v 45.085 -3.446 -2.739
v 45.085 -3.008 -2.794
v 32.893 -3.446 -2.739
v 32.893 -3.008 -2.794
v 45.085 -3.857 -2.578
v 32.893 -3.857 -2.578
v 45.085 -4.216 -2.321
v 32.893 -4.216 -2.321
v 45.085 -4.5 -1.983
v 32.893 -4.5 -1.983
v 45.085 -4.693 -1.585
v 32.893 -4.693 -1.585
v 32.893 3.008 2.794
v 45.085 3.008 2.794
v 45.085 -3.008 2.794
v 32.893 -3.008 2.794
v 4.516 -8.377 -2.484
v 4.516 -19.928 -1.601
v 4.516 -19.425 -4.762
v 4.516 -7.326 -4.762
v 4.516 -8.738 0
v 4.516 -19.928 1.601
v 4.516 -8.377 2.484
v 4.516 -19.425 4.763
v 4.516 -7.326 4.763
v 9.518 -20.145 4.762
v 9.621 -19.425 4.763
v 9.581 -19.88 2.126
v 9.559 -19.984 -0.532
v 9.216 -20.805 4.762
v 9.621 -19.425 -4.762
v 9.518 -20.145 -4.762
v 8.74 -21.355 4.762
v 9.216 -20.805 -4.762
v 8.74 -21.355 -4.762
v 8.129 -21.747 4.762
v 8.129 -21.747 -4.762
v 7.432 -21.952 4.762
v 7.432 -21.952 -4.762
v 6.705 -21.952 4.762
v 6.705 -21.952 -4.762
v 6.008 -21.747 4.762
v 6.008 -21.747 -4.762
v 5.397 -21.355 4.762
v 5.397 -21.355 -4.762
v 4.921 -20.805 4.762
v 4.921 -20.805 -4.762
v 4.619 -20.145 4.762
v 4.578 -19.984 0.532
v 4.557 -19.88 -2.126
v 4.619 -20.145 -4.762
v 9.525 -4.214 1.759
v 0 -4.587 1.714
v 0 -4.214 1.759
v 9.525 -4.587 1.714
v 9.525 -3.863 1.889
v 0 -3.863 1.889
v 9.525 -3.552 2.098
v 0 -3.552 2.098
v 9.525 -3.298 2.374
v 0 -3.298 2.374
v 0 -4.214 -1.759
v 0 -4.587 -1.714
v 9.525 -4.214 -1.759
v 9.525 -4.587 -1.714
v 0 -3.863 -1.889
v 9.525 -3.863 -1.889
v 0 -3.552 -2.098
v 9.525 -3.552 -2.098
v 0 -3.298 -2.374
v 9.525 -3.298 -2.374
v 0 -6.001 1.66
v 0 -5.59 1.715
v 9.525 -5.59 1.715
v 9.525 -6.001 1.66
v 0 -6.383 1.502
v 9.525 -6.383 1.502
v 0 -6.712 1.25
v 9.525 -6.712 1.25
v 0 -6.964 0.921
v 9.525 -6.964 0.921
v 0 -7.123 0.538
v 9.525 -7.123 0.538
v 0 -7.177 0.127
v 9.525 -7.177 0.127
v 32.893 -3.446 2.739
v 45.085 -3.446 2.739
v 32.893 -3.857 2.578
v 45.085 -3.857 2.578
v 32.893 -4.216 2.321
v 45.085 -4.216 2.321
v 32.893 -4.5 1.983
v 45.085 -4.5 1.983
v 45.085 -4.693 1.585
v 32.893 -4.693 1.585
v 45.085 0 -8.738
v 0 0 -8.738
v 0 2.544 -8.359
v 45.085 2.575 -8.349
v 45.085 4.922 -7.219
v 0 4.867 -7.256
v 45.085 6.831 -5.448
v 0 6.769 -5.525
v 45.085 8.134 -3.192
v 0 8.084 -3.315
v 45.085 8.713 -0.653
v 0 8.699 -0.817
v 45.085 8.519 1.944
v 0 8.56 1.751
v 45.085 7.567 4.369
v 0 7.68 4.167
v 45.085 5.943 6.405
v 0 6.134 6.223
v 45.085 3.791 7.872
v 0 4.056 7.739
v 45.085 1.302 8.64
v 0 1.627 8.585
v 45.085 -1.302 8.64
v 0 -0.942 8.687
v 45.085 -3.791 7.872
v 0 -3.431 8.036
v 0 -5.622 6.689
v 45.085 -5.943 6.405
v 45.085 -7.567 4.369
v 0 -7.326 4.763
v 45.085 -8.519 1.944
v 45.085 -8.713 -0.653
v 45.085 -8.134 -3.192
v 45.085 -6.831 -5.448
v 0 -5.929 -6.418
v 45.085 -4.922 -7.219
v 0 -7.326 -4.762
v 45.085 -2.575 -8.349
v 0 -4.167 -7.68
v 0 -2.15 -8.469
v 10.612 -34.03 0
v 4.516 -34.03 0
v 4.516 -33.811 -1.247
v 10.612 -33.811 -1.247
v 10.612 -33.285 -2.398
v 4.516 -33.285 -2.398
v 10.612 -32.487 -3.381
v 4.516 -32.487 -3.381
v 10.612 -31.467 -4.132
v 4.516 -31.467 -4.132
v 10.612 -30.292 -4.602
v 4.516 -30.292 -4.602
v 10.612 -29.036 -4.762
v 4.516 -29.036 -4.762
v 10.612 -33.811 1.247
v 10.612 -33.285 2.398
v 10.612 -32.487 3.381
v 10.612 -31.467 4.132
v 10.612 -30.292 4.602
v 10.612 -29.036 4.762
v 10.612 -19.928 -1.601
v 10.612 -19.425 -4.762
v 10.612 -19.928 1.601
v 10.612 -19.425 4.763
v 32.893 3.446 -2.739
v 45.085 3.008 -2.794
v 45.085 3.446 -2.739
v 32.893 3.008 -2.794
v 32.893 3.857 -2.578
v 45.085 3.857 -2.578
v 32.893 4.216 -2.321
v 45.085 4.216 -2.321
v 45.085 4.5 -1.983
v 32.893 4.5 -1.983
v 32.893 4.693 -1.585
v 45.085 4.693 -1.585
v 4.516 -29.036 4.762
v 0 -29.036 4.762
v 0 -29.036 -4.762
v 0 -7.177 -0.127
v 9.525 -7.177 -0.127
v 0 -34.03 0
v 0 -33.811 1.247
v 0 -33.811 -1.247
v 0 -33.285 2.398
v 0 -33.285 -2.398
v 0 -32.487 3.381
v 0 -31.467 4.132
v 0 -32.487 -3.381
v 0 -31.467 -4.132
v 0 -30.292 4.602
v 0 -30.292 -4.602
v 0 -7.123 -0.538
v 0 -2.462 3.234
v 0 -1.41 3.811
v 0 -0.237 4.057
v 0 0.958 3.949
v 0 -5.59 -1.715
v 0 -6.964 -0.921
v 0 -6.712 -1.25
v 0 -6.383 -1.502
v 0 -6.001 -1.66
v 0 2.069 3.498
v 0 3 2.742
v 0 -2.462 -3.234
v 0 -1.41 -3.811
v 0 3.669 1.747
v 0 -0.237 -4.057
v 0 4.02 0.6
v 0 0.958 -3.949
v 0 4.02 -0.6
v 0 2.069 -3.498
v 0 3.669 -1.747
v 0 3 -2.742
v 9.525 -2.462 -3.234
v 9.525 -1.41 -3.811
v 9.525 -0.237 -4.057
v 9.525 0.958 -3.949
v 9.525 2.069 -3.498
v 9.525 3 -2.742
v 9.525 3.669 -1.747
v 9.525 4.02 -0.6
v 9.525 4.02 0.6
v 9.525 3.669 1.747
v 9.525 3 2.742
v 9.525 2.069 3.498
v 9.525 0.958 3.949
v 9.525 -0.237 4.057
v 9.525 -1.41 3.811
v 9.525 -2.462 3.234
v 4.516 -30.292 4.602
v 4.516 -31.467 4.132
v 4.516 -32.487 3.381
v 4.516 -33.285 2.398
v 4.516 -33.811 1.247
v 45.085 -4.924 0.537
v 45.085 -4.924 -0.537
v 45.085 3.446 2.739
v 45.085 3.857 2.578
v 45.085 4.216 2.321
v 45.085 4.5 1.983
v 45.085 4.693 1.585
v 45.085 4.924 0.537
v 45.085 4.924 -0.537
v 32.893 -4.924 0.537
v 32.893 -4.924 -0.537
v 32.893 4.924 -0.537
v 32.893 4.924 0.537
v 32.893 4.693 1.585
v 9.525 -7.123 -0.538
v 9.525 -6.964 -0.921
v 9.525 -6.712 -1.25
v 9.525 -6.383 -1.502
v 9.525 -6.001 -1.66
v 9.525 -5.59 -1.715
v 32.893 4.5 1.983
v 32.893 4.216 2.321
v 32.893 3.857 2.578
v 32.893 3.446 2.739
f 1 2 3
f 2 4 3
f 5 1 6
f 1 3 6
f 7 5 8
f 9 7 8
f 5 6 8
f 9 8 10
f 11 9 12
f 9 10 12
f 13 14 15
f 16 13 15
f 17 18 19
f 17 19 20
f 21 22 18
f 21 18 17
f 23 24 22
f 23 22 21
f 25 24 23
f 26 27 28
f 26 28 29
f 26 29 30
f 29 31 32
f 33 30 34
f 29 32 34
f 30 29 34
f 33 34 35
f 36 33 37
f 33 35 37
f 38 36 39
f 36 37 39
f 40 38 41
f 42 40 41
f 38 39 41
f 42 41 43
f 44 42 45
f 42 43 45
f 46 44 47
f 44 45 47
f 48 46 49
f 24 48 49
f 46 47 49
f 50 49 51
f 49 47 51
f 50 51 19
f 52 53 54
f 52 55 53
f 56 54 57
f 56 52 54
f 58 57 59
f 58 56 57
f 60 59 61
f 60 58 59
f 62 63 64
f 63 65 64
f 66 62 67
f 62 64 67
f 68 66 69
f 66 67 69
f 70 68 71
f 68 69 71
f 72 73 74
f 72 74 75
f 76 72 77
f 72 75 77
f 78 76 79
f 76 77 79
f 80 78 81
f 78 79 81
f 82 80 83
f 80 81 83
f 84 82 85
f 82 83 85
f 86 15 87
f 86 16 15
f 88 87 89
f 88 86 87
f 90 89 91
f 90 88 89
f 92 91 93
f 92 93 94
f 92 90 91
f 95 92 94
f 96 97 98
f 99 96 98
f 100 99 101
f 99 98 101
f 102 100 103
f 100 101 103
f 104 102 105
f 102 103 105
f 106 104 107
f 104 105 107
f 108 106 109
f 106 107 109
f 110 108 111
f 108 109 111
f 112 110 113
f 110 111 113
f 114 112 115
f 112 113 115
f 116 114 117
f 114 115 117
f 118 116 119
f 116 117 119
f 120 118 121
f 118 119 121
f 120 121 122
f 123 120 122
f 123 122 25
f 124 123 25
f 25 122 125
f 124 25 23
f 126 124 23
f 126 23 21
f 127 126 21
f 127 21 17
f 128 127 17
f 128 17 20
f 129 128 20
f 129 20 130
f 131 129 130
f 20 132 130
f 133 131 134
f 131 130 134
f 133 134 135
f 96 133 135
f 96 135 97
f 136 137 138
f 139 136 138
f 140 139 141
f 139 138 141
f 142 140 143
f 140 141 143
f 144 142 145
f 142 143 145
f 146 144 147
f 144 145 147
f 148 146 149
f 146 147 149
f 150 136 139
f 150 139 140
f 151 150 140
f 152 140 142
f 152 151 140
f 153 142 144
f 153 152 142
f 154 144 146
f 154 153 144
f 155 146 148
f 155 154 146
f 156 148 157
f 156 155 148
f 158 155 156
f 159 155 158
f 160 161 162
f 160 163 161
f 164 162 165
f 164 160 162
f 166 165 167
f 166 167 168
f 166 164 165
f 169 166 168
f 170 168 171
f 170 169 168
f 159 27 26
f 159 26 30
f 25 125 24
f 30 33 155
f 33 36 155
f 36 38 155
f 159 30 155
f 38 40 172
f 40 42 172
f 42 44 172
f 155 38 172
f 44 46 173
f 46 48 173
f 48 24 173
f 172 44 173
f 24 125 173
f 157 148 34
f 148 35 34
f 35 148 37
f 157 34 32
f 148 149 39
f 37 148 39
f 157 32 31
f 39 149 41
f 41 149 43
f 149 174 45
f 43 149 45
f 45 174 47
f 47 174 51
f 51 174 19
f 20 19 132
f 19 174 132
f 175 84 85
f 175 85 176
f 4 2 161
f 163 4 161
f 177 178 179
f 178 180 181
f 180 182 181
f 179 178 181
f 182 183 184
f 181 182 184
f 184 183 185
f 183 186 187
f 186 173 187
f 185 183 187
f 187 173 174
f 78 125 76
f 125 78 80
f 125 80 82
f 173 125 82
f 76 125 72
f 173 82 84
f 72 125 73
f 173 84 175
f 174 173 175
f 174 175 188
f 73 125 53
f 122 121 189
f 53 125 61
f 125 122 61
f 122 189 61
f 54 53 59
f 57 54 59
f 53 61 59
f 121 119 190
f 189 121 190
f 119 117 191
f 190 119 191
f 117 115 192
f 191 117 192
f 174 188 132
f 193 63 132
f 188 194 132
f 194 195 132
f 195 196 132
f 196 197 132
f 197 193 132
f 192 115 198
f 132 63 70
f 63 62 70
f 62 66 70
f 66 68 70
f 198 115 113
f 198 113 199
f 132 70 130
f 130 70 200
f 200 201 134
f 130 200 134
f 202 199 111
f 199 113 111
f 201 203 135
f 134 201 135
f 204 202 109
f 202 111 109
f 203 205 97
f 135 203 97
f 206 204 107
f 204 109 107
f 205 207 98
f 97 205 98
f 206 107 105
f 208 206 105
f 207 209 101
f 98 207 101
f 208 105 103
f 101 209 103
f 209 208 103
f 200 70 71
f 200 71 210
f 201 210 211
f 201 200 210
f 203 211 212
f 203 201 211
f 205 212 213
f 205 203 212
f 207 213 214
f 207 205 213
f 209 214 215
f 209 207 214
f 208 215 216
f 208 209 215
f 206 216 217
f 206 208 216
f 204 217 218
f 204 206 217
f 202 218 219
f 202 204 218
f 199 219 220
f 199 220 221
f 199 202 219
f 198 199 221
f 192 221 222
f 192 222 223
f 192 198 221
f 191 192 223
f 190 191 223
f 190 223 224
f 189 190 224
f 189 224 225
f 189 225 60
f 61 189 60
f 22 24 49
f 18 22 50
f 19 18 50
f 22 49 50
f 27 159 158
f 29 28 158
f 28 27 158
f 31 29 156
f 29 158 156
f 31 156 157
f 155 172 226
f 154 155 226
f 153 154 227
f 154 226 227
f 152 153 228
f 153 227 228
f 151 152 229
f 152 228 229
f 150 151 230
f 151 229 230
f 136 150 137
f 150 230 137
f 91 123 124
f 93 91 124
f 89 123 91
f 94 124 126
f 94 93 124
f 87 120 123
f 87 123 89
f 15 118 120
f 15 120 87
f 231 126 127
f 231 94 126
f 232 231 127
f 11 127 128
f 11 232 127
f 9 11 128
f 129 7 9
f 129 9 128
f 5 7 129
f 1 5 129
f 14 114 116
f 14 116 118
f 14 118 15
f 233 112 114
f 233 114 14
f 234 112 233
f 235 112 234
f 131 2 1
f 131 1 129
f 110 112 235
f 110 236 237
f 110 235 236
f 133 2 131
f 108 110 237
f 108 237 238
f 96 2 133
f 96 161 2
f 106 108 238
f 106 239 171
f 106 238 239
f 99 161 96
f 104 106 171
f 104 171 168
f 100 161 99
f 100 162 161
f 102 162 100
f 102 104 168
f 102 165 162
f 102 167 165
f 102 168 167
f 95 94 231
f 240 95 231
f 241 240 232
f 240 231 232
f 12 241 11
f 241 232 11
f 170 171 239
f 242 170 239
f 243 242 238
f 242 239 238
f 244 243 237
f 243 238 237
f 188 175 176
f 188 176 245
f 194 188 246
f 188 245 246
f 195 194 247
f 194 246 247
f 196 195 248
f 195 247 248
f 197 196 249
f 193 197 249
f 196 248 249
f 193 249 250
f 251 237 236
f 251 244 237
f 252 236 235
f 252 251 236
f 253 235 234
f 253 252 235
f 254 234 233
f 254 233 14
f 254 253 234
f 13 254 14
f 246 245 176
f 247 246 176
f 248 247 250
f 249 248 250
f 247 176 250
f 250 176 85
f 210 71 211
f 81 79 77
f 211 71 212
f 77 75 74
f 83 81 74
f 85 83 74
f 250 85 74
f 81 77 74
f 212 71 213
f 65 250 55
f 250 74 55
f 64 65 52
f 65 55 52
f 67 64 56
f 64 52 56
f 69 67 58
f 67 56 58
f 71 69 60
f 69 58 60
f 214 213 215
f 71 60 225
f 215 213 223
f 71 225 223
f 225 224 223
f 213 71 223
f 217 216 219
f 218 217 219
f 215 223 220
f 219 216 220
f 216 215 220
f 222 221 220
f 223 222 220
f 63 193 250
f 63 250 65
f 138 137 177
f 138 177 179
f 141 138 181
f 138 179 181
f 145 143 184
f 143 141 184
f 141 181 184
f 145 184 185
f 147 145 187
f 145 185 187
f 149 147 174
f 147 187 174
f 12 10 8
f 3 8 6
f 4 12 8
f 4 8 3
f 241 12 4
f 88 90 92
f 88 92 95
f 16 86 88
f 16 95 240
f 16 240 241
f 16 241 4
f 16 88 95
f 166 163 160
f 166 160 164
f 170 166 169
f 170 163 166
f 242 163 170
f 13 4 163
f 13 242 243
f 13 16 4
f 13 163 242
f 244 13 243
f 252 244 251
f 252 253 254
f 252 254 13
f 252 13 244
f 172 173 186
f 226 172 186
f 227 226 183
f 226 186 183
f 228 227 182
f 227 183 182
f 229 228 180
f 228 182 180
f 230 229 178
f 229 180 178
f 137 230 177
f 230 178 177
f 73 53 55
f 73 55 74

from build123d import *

# Parameters (mm, degrees)
SKETCH1_R           = 8.7376
BOSS_EXTRUDE1_DEPTH = 45.085
BOSS_EXTRUDE3_DEPTH = 4.516000112
FILLET2_R           = 5
BOSS_EXTRUDE4_DEPTH = 6.096
CUT_EXTRUDE8_DEPTH  = 6.096
CUT_EXTRUDE10_DEPTH = 12.192
FILLET11_R          = 1.778
SKETCH25_R          = 2.5527
CUT_EXTRUDE14_DEPTH = 59.077319733
CUT_EXTRUDE15_DEPTH = 9.525
FILLET12_R          = 1.5875


with BuildPart() as part:
    # Sketch1 → Boss-Extrude1 (new body)
    with BuildSketch(Plane.YZ):
        with Locations(Location((0, 0, 0), (0, 0, 270))):
            Circle(SKETCH1_R)
    extrude(amount=BOSS_EXTRUDE1_DEPTH)

    # Sketch10 → Boss-Extrude3 (add)
    with BuildSketch(Plane(origin=(0, 0, 0), x_dir=(0, -1, 0), z_dir=(-1, 0, 0))):
        with BuildLine():
            Line((7.325588544, 4.7625), (34.036, 4.7625))
            Line((34.036, 4.7625), (34.036, -4.7625))
            Line((34.036, -4.7625), (7.325588544, -4.7625))
            ThreePointArc((7.325588544, -4.7625), (8.7376, 0), (7.325588544, 4.7625))
        make_face()
    extrude(amount=-BOSS_EXTRUDE3_DEPTH)

    # Fillet2
    # the kernel refuses this fillet: 5 mm, written as the material it takes off along each edge
    with BuildSketch(Plane(origin=(-12.5, -34.036, 4.7625), x_dir=(0, 1, 0), z_dir=(1, 0, 0))) as fillet2_piece_1:
        with BuildLine():
            CenterArc((FILLET2_R, -FILLET2_R), FILLET2_R, 90, 90)
            Line((0, -FILLET2_R), (0, 0))
            Line((0, 0), (FILLET2_R, 0))
        make_face()
    extrude(amount=29.516000112, mode=Mode.SUBTRACT)
    with BuildSketch(Plane(origin=(-12.5, -34.036, -4.7625), x_dir=(0, 1, 0), z_dir=(1, 0, 0))) as fillet2_piece_2:
        with BuildLine():
            CenterArc((FILLET2_R, FILLET2_R), FILLET2_R, 180, 90)
            Line((0, FILLET2_R), (0, 0))
            Line((0, 0), (FILLET2_R, 0))
        make_face()
    extrude(amount=29.516000112, mode=Mode.SUBTRACT)

    # Sketch15 → Boss-Extrude4 (add)
    with BuildSketch(Plane.YZ.offset(4.516000112)):
        with BuildLine():
            Line((-18.79035619, -4.7625), (-18.79035619, 4.7625))
            Line((-18.79035619, 4.7625), (-29.036, 4.7625))
            ThreePointArc((-29.036, 4.7625), (-32.486543435, 3.381028707), (-34.03035619, 0))
            ThreePointArc((-34.03035619, 0), (-32.486543435, -3.381028707), (-29.036, -4.7625))
            Line((-29.036, -4.7625), (-18.79035619, -4.7625))
        make_face()
    extrude(amount=BOSS_EXTRUDE4_DEPTH)

    # Sketch21 → Cut-Extrude8 (cut)
    with BuildSketch(Plane.YZ.offset(10.612000112)):
        with BuildLine():
            Line((-19.42535619, -4.7625), (-18.79035619, -4.7625))
            Line((-18.79035619, -4.7625), (-18.79035619, 4.7625))
            Line((-18.79035619, 4.7625), (-19.42535619, 4.7625))
            ThreePointArc((-19.42535619, 4.7625), (-19.991344097, 0), (-19.42535619, -4.7625))
        make_face()
    extrude(amount=-CUT_EXTRUDE8_DEPTH, mode=Mode.SUBTRACT)

    # Sketch22 → Cut-Extrude10 (cut)
    with BuildSketch(Plane.YZ.offset(45.085)):
        with BuildLine():
            Line((-4.089715516, -2.794), (4.089715516, -2.794))
            ThreePointArc((4.089715516, -2.794), (4.953, 0), (4.089715516, 2.794))
            Line((4.089715516, 2.794), (-4.089715516, 2.794))
            ThreePointArc((-4.089715516, 2.794), (-4.953, 0), (-4.089715516, -2.794))
        make_face()
    extrude(amount=-CUT_EXTRUDE10_DEPTH, mode=Mode.SUBTRACT)

    # Fillet11
    fillet11_edges = [part.edges().sort_by_distance(p)[0] for p in [
        (38.989, 4.089715516, 2.794),
        (38.989, 4.089715516, -2.794),
        (38.989, -4.089715516, -2.794),
        (38.989, -4.089715516, 2.794),
    ]]
    fillet(fillet11_edges, radius=FILLET11_R)

    # Sketch25 → Cut-Extrude14 (cut, through all)
    with BuildSketch(Plane(origin=(0, 0, -4.7625), x_dir=(1, 0, 0), z_dir=(0, 0, -1))):
        with Locations((7.068700112, 19.42535619)):
            Circle(SKETCH25_R)
    extrude(amount=-CUT_EXTRUDE14_DEPTH, mode=Mode.SUBTRACT)

    # Sketch26 → Cut-Extrude15 (cut)
    with BuildSketch(Plane(origin=(0, 0, 0), x_dir=(0, -1, 0), z_dir=(-1, 0, 0))):
        with BuildLine():
            Line((3.684641875, 1.7145), (7.177141875, 1.7145))
            Line((7.177141875, 1.7145), (7.177141875, -1.7145))
            Line((7.177141875, -1.7145), (3.684641875, -1.7145))
            ThreePointArc((3.684641875, -1.7145), (-4.064, 0), (3.684641875, 1.7145))
        make_face()
    extrude(amount=-CUT_EXTRUDE15_DEPTH, mode=Mode.SUBTRACT)

    # Fillet12
    fillet12_edges = [part.edges().sort_by_distance(p)[0] for p in [
        (4.7625, -3.684641875, -1.7145),
        (4.7625, -3.684641875, 1.7145),
        (4.7625, -7.177141875, 1.7145),
        (4.7625, -7.177141875, -1.7145),
    ]]
    fillet(fillet12_edges, radius=FILLET12_R)


solid = part.part
